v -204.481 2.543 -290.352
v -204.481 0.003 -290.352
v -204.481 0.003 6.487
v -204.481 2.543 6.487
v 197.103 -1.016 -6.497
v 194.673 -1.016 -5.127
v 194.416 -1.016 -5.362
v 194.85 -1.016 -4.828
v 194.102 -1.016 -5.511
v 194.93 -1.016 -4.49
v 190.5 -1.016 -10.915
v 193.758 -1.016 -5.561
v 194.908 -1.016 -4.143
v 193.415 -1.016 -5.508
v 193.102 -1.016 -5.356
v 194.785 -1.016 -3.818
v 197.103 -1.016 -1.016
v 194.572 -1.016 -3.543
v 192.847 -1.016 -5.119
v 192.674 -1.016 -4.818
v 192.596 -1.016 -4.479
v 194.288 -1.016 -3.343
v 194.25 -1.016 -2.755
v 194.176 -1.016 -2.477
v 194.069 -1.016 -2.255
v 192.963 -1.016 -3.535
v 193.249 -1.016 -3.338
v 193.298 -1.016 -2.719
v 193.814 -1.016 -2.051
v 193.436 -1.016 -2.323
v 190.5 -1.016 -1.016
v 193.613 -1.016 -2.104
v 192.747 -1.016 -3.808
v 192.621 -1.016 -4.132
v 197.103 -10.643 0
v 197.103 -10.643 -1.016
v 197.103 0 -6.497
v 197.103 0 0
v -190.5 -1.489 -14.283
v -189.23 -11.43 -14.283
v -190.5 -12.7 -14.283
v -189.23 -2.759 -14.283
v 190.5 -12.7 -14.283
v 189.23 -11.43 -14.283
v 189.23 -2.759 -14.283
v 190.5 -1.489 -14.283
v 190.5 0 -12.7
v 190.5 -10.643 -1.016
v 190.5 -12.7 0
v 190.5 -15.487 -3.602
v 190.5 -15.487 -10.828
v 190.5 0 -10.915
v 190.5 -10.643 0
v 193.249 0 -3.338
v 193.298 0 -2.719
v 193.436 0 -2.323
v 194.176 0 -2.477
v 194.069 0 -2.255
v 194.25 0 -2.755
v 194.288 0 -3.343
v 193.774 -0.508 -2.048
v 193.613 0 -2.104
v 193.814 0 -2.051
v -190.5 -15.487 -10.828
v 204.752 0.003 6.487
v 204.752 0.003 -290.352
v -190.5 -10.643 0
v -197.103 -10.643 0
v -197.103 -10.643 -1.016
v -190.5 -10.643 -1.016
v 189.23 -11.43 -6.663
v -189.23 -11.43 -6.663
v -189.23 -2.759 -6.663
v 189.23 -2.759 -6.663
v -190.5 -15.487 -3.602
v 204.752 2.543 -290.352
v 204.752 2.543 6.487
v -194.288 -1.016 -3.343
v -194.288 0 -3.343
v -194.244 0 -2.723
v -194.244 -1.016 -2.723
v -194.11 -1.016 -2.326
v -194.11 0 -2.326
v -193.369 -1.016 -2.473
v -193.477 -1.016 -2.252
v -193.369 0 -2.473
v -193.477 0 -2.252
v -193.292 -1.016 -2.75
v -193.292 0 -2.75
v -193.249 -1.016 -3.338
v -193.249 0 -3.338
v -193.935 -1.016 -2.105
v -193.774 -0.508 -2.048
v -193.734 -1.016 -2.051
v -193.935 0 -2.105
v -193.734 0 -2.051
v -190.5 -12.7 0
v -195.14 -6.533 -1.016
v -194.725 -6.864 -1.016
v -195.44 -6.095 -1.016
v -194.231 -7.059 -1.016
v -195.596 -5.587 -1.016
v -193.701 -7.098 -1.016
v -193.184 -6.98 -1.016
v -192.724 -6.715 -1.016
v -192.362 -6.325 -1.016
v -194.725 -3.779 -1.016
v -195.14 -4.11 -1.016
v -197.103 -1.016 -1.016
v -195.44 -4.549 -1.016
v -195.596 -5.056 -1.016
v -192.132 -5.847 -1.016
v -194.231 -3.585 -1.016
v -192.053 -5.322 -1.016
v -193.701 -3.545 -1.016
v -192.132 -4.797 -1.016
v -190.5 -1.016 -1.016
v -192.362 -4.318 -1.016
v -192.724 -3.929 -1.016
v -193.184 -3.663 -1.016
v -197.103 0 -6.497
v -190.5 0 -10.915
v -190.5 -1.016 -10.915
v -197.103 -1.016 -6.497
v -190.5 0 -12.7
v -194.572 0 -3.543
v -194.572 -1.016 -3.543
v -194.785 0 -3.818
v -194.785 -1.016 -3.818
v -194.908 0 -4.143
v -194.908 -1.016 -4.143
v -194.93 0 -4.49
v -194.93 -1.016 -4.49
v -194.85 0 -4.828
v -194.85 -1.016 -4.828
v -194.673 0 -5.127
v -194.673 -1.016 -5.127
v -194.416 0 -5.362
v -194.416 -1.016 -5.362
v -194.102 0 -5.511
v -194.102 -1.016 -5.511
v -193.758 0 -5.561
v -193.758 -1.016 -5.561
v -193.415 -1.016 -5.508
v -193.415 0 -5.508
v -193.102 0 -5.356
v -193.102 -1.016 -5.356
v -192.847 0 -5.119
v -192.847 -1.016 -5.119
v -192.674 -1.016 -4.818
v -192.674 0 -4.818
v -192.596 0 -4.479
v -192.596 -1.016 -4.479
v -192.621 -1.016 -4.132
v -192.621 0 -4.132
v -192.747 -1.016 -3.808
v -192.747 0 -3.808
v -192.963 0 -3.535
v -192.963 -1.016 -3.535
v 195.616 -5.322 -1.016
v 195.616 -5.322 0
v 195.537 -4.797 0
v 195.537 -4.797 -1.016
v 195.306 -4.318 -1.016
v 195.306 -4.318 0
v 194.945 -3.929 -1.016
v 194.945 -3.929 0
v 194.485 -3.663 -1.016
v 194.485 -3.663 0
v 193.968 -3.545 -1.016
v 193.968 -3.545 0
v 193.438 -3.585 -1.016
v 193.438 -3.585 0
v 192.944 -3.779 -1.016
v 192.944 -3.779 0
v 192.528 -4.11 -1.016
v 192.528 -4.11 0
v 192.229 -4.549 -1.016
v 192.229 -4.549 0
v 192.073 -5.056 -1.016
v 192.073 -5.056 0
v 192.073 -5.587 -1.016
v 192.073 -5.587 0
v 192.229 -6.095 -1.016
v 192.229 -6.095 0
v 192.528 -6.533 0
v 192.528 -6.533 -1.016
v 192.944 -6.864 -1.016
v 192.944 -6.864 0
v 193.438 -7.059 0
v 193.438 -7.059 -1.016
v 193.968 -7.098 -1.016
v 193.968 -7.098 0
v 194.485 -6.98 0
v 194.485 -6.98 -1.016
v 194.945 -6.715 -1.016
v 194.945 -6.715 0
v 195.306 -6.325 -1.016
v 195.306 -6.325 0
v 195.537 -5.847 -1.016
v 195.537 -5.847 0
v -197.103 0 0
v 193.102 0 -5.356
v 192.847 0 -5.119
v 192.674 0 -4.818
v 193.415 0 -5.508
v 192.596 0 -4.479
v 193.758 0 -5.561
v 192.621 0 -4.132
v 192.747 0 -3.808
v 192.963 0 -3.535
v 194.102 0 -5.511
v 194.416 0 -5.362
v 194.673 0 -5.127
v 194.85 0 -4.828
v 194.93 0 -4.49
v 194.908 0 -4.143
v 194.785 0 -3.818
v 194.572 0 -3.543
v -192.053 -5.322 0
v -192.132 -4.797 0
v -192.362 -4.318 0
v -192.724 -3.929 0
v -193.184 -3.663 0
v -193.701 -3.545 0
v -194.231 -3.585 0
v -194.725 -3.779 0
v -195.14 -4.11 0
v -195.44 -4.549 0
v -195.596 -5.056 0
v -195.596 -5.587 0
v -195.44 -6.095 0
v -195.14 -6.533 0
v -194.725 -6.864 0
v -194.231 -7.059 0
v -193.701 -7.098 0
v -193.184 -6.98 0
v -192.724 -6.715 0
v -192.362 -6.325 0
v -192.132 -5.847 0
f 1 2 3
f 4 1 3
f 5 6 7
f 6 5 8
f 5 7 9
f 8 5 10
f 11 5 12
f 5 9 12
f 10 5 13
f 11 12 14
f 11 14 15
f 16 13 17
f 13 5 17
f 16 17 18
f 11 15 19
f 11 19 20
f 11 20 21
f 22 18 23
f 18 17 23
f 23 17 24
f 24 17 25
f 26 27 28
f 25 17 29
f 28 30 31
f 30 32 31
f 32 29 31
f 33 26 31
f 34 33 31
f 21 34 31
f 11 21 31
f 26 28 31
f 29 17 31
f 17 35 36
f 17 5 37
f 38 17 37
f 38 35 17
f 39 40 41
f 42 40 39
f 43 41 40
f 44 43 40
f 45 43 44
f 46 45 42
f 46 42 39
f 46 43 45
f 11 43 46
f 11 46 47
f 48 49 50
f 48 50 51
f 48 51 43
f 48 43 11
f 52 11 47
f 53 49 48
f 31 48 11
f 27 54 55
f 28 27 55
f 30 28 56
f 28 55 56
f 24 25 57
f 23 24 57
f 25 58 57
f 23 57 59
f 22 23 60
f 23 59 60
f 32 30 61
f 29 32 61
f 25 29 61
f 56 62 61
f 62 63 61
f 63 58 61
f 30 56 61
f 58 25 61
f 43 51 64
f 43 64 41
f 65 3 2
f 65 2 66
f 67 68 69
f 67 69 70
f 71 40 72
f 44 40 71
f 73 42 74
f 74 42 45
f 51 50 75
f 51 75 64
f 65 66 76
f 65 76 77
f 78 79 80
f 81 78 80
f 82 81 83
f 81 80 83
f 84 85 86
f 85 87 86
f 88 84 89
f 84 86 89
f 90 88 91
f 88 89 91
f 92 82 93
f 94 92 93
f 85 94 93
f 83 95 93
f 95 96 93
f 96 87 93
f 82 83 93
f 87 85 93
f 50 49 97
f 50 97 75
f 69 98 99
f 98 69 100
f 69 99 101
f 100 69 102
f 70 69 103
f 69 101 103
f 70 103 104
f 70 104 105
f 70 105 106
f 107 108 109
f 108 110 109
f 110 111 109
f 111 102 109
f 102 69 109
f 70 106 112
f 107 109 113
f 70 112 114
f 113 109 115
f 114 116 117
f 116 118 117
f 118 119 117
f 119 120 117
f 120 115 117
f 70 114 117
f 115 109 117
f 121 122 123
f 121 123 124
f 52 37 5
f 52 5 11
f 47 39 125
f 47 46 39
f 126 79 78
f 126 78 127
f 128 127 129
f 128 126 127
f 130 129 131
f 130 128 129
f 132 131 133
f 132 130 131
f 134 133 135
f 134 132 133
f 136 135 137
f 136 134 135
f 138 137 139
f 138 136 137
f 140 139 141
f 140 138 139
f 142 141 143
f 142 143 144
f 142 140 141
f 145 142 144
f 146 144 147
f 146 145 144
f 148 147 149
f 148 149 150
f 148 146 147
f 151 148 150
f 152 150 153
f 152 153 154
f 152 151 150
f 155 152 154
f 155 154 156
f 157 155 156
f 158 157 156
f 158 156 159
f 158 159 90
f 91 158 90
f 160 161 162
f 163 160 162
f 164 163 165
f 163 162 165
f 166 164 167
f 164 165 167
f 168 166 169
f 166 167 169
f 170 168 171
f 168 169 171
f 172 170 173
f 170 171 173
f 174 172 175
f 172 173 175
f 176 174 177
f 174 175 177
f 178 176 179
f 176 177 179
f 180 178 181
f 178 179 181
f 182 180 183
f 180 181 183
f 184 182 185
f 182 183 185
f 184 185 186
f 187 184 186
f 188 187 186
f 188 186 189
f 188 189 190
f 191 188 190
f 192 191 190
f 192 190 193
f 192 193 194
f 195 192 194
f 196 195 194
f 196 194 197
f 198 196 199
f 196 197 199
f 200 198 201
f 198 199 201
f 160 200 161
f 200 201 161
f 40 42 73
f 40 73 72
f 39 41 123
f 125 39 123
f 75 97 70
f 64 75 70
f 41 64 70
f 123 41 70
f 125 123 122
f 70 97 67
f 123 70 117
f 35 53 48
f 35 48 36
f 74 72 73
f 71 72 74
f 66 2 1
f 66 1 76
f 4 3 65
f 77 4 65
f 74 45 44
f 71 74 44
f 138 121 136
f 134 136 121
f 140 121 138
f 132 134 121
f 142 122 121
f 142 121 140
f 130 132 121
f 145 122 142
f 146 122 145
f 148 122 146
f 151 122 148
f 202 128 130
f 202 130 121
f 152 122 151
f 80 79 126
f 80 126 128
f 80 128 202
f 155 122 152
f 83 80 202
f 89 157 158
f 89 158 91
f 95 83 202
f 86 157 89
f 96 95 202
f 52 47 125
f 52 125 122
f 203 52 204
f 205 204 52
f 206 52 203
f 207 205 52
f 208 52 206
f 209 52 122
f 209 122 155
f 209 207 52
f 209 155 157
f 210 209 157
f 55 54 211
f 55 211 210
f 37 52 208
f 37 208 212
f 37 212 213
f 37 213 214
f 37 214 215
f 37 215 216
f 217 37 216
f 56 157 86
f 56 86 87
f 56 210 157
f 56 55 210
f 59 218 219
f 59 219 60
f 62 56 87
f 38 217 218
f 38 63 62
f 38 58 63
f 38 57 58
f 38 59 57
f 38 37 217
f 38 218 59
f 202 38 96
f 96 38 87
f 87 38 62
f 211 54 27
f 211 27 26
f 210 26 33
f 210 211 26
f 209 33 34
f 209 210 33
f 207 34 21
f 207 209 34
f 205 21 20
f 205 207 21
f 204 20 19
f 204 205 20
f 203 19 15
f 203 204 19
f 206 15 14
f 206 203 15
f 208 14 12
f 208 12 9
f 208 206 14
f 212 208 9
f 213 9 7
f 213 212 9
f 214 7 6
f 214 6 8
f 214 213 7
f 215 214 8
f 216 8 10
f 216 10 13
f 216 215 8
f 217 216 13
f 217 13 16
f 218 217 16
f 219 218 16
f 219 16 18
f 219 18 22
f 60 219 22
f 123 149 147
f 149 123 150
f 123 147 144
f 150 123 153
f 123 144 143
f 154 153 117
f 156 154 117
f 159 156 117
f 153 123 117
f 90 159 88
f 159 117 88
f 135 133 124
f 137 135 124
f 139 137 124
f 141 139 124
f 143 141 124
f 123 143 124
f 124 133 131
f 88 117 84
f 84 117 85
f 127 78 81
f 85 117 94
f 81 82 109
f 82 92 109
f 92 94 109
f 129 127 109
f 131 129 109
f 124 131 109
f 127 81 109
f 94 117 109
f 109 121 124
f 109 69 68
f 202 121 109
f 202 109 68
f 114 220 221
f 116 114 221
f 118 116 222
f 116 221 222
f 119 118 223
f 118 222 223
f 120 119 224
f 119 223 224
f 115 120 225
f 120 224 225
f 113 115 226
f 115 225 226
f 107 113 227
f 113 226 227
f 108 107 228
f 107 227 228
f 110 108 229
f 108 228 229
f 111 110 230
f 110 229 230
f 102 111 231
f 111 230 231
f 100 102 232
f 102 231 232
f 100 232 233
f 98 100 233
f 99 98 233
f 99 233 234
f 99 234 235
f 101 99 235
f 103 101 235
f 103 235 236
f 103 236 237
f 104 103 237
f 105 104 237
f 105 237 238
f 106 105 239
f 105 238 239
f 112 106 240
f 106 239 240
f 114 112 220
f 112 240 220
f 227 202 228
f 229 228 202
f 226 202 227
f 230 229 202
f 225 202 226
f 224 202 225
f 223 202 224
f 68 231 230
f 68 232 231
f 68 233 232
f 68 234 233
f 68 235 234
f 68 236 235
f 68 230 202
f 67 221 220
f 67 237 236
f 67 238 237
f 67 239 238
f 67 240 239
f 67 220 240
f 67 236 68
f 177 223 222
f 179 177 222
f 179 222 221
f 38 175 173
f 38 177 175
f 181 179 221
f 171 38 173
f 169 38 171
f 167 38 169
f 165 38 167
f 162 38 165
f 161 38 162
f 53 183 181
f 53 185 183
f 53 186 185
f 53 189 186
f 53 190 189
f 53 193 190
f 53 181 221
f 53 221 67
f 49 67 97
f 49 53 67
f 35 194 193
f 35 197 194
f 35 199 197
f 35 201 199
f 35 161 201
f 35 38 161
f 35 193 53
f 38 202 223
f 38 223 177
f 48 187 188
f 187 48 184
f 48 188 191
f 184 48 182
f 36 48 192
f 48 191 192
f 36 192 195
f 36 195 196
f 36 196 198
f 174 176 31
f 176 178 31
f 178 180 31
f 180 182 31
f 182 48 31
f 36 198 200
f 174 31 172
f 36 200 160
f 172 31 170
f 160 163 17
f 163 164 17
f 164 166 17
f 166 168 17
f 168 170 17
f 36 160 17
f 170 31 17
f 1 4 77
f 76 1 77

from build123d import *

# Parameters (mm, degrees)
F1_DEPTH  = 190.5
F2_W      = 378.46
F2_H      = 8.671001002
F3_DEPTH  = 7.62
F6_DEPTH  = 1.016
F8_W      = 6.6032768488
F8_H      = 10.6432642788
F8_R      = 1.781548847
F9_DEPTH  = 1.016
F11_W     = 409.2337787151
F11_H     = 296.8385680579
F12_DEPTH = 2.54


with BuildPart() as f1:
    # F0 (on Right) → F1 (new body, symmetric)
    with BuildSketch(Plane.YZ):
        Polygon((0, -12.7), (0, 0), (-12.7, 0), (-15.4874324799, -3.6016106606), (-15.4874324799, -10.8280887524), (-12.7, -14.2828794196), (-1.488998998, -14.2828794196), align=None)
    extrude(amount=F1_DEPTH, both=True)

    # F2 (on face) → F3 (cut)
    with BuildSketch(Plane(origin=(0, 0, -14.2828794196), x_dir=(1, 0, 0), z_dir=(0, 0, -1))):
        with Locations((0, 7.094499499)):
            Rectangle(F2_W, F2_H)
    extrude(amount=-F3_DEPTH, mode=Mode.SUBTRACT)

    # F5 (on face) → F6 (join)
    with BuildSketch(Plane(origin=(0, 0, 0), x_dir=(-1, 0, 0), z_dir=(0, 1, 0))):
        Polygon((-189.7398233414, -11.4231714979), (-189.7398233414, 0), (-197.1032768488, 0), (-197.1032768488, -6.4969165251), align=None)
        with BuildLine():
            ThreePointArc((-193.2487062213, -3.3378815267), (-193.7581516271, -5.5607062907), (-194.2880846195, -3.3426766298))
            add(Edge.make_bspline(
                [(-193.2487062213, -3.3378815267), (-193.194434042, -2.0449407695), (-193.7743590345, -2.0476162149), (-194.3542840271, -2.0502916603), (-194.2880846195, -3.3426766298)],
                knots=[1.4667403996, 1.4667403996, 1.4667403996, 3.1415926536, 3.1415926536, 4.8164449075, 4.8164449075, 4.8164449075], degree=2, weights=[1, 0.6693772297, 1, 0.6693772297, 1]))
        make_face(mode=Mode.SUBTRACT)
        Polygon((189.7398233414, 0), (189.7398233414, -11.4231714979), (197.1032768488, -6.4969165251), (197.1032768488, 0), align=None)
        with BuildLine():
            add(Edge.make_bspline(
                [(194.2880846195, -3.3426766298), (194.3542840271, -2.0502916603), (193.7743590345, -2.0476162149), (193.194434042, -2.0449407695), (193.2487062213, -3.3378815267)],
                knots=[1.4667403996, 1.4667403996, 1.4667403996, 3.1415926536, 3.1415926536, 4.8164449075, 4.8164449075, 4.8164449075], degree=2, weights=[1, 0.6693772297, 1, 0.6693772297, 1]))
            ThreePointArc((194.2880846195, -3.3426766298), (193.7581516271, -5.5607062907), (193.2487062213, -3.3378815267))
        make_face(mode=Mode.SUBTRACT)
    extrude(amount=-F6_DEPTH)

    # F8 (on face) → F9 (join)
    with BuildSketch(Plane.XY):
        with Locations((193.8016384244, -5.3216321394)):
            Rectangle(F8_W, F8_H)
        with Locations((193.8343942165, -5.3216321394)):
            Circle(F8_R, mode=Mode.SUBTRACT)
        with Locations((-193.8016384244, -5.3216321394)):
            Rectangle(F8_W, F8_H)
        with Locations((-193.8343942165, -5.3216321394)):
            Circle(F8_R, mode=Mode.SUBTRACT)
    extrude(amount=-F9_DEPTH)


with BuildPart() as f12:
    # F11 (on offset) → F12 (new body)
    with BuildSketch(Plane.XZ.offset(-0.00254)):
        with Locations((0.1355409622, -141.9327028561)):
            Rectangle(F11_W, F11_H)
    extrude(amount=-F12_DEPTH)


solid = Compound([f1.part, f12.part])
